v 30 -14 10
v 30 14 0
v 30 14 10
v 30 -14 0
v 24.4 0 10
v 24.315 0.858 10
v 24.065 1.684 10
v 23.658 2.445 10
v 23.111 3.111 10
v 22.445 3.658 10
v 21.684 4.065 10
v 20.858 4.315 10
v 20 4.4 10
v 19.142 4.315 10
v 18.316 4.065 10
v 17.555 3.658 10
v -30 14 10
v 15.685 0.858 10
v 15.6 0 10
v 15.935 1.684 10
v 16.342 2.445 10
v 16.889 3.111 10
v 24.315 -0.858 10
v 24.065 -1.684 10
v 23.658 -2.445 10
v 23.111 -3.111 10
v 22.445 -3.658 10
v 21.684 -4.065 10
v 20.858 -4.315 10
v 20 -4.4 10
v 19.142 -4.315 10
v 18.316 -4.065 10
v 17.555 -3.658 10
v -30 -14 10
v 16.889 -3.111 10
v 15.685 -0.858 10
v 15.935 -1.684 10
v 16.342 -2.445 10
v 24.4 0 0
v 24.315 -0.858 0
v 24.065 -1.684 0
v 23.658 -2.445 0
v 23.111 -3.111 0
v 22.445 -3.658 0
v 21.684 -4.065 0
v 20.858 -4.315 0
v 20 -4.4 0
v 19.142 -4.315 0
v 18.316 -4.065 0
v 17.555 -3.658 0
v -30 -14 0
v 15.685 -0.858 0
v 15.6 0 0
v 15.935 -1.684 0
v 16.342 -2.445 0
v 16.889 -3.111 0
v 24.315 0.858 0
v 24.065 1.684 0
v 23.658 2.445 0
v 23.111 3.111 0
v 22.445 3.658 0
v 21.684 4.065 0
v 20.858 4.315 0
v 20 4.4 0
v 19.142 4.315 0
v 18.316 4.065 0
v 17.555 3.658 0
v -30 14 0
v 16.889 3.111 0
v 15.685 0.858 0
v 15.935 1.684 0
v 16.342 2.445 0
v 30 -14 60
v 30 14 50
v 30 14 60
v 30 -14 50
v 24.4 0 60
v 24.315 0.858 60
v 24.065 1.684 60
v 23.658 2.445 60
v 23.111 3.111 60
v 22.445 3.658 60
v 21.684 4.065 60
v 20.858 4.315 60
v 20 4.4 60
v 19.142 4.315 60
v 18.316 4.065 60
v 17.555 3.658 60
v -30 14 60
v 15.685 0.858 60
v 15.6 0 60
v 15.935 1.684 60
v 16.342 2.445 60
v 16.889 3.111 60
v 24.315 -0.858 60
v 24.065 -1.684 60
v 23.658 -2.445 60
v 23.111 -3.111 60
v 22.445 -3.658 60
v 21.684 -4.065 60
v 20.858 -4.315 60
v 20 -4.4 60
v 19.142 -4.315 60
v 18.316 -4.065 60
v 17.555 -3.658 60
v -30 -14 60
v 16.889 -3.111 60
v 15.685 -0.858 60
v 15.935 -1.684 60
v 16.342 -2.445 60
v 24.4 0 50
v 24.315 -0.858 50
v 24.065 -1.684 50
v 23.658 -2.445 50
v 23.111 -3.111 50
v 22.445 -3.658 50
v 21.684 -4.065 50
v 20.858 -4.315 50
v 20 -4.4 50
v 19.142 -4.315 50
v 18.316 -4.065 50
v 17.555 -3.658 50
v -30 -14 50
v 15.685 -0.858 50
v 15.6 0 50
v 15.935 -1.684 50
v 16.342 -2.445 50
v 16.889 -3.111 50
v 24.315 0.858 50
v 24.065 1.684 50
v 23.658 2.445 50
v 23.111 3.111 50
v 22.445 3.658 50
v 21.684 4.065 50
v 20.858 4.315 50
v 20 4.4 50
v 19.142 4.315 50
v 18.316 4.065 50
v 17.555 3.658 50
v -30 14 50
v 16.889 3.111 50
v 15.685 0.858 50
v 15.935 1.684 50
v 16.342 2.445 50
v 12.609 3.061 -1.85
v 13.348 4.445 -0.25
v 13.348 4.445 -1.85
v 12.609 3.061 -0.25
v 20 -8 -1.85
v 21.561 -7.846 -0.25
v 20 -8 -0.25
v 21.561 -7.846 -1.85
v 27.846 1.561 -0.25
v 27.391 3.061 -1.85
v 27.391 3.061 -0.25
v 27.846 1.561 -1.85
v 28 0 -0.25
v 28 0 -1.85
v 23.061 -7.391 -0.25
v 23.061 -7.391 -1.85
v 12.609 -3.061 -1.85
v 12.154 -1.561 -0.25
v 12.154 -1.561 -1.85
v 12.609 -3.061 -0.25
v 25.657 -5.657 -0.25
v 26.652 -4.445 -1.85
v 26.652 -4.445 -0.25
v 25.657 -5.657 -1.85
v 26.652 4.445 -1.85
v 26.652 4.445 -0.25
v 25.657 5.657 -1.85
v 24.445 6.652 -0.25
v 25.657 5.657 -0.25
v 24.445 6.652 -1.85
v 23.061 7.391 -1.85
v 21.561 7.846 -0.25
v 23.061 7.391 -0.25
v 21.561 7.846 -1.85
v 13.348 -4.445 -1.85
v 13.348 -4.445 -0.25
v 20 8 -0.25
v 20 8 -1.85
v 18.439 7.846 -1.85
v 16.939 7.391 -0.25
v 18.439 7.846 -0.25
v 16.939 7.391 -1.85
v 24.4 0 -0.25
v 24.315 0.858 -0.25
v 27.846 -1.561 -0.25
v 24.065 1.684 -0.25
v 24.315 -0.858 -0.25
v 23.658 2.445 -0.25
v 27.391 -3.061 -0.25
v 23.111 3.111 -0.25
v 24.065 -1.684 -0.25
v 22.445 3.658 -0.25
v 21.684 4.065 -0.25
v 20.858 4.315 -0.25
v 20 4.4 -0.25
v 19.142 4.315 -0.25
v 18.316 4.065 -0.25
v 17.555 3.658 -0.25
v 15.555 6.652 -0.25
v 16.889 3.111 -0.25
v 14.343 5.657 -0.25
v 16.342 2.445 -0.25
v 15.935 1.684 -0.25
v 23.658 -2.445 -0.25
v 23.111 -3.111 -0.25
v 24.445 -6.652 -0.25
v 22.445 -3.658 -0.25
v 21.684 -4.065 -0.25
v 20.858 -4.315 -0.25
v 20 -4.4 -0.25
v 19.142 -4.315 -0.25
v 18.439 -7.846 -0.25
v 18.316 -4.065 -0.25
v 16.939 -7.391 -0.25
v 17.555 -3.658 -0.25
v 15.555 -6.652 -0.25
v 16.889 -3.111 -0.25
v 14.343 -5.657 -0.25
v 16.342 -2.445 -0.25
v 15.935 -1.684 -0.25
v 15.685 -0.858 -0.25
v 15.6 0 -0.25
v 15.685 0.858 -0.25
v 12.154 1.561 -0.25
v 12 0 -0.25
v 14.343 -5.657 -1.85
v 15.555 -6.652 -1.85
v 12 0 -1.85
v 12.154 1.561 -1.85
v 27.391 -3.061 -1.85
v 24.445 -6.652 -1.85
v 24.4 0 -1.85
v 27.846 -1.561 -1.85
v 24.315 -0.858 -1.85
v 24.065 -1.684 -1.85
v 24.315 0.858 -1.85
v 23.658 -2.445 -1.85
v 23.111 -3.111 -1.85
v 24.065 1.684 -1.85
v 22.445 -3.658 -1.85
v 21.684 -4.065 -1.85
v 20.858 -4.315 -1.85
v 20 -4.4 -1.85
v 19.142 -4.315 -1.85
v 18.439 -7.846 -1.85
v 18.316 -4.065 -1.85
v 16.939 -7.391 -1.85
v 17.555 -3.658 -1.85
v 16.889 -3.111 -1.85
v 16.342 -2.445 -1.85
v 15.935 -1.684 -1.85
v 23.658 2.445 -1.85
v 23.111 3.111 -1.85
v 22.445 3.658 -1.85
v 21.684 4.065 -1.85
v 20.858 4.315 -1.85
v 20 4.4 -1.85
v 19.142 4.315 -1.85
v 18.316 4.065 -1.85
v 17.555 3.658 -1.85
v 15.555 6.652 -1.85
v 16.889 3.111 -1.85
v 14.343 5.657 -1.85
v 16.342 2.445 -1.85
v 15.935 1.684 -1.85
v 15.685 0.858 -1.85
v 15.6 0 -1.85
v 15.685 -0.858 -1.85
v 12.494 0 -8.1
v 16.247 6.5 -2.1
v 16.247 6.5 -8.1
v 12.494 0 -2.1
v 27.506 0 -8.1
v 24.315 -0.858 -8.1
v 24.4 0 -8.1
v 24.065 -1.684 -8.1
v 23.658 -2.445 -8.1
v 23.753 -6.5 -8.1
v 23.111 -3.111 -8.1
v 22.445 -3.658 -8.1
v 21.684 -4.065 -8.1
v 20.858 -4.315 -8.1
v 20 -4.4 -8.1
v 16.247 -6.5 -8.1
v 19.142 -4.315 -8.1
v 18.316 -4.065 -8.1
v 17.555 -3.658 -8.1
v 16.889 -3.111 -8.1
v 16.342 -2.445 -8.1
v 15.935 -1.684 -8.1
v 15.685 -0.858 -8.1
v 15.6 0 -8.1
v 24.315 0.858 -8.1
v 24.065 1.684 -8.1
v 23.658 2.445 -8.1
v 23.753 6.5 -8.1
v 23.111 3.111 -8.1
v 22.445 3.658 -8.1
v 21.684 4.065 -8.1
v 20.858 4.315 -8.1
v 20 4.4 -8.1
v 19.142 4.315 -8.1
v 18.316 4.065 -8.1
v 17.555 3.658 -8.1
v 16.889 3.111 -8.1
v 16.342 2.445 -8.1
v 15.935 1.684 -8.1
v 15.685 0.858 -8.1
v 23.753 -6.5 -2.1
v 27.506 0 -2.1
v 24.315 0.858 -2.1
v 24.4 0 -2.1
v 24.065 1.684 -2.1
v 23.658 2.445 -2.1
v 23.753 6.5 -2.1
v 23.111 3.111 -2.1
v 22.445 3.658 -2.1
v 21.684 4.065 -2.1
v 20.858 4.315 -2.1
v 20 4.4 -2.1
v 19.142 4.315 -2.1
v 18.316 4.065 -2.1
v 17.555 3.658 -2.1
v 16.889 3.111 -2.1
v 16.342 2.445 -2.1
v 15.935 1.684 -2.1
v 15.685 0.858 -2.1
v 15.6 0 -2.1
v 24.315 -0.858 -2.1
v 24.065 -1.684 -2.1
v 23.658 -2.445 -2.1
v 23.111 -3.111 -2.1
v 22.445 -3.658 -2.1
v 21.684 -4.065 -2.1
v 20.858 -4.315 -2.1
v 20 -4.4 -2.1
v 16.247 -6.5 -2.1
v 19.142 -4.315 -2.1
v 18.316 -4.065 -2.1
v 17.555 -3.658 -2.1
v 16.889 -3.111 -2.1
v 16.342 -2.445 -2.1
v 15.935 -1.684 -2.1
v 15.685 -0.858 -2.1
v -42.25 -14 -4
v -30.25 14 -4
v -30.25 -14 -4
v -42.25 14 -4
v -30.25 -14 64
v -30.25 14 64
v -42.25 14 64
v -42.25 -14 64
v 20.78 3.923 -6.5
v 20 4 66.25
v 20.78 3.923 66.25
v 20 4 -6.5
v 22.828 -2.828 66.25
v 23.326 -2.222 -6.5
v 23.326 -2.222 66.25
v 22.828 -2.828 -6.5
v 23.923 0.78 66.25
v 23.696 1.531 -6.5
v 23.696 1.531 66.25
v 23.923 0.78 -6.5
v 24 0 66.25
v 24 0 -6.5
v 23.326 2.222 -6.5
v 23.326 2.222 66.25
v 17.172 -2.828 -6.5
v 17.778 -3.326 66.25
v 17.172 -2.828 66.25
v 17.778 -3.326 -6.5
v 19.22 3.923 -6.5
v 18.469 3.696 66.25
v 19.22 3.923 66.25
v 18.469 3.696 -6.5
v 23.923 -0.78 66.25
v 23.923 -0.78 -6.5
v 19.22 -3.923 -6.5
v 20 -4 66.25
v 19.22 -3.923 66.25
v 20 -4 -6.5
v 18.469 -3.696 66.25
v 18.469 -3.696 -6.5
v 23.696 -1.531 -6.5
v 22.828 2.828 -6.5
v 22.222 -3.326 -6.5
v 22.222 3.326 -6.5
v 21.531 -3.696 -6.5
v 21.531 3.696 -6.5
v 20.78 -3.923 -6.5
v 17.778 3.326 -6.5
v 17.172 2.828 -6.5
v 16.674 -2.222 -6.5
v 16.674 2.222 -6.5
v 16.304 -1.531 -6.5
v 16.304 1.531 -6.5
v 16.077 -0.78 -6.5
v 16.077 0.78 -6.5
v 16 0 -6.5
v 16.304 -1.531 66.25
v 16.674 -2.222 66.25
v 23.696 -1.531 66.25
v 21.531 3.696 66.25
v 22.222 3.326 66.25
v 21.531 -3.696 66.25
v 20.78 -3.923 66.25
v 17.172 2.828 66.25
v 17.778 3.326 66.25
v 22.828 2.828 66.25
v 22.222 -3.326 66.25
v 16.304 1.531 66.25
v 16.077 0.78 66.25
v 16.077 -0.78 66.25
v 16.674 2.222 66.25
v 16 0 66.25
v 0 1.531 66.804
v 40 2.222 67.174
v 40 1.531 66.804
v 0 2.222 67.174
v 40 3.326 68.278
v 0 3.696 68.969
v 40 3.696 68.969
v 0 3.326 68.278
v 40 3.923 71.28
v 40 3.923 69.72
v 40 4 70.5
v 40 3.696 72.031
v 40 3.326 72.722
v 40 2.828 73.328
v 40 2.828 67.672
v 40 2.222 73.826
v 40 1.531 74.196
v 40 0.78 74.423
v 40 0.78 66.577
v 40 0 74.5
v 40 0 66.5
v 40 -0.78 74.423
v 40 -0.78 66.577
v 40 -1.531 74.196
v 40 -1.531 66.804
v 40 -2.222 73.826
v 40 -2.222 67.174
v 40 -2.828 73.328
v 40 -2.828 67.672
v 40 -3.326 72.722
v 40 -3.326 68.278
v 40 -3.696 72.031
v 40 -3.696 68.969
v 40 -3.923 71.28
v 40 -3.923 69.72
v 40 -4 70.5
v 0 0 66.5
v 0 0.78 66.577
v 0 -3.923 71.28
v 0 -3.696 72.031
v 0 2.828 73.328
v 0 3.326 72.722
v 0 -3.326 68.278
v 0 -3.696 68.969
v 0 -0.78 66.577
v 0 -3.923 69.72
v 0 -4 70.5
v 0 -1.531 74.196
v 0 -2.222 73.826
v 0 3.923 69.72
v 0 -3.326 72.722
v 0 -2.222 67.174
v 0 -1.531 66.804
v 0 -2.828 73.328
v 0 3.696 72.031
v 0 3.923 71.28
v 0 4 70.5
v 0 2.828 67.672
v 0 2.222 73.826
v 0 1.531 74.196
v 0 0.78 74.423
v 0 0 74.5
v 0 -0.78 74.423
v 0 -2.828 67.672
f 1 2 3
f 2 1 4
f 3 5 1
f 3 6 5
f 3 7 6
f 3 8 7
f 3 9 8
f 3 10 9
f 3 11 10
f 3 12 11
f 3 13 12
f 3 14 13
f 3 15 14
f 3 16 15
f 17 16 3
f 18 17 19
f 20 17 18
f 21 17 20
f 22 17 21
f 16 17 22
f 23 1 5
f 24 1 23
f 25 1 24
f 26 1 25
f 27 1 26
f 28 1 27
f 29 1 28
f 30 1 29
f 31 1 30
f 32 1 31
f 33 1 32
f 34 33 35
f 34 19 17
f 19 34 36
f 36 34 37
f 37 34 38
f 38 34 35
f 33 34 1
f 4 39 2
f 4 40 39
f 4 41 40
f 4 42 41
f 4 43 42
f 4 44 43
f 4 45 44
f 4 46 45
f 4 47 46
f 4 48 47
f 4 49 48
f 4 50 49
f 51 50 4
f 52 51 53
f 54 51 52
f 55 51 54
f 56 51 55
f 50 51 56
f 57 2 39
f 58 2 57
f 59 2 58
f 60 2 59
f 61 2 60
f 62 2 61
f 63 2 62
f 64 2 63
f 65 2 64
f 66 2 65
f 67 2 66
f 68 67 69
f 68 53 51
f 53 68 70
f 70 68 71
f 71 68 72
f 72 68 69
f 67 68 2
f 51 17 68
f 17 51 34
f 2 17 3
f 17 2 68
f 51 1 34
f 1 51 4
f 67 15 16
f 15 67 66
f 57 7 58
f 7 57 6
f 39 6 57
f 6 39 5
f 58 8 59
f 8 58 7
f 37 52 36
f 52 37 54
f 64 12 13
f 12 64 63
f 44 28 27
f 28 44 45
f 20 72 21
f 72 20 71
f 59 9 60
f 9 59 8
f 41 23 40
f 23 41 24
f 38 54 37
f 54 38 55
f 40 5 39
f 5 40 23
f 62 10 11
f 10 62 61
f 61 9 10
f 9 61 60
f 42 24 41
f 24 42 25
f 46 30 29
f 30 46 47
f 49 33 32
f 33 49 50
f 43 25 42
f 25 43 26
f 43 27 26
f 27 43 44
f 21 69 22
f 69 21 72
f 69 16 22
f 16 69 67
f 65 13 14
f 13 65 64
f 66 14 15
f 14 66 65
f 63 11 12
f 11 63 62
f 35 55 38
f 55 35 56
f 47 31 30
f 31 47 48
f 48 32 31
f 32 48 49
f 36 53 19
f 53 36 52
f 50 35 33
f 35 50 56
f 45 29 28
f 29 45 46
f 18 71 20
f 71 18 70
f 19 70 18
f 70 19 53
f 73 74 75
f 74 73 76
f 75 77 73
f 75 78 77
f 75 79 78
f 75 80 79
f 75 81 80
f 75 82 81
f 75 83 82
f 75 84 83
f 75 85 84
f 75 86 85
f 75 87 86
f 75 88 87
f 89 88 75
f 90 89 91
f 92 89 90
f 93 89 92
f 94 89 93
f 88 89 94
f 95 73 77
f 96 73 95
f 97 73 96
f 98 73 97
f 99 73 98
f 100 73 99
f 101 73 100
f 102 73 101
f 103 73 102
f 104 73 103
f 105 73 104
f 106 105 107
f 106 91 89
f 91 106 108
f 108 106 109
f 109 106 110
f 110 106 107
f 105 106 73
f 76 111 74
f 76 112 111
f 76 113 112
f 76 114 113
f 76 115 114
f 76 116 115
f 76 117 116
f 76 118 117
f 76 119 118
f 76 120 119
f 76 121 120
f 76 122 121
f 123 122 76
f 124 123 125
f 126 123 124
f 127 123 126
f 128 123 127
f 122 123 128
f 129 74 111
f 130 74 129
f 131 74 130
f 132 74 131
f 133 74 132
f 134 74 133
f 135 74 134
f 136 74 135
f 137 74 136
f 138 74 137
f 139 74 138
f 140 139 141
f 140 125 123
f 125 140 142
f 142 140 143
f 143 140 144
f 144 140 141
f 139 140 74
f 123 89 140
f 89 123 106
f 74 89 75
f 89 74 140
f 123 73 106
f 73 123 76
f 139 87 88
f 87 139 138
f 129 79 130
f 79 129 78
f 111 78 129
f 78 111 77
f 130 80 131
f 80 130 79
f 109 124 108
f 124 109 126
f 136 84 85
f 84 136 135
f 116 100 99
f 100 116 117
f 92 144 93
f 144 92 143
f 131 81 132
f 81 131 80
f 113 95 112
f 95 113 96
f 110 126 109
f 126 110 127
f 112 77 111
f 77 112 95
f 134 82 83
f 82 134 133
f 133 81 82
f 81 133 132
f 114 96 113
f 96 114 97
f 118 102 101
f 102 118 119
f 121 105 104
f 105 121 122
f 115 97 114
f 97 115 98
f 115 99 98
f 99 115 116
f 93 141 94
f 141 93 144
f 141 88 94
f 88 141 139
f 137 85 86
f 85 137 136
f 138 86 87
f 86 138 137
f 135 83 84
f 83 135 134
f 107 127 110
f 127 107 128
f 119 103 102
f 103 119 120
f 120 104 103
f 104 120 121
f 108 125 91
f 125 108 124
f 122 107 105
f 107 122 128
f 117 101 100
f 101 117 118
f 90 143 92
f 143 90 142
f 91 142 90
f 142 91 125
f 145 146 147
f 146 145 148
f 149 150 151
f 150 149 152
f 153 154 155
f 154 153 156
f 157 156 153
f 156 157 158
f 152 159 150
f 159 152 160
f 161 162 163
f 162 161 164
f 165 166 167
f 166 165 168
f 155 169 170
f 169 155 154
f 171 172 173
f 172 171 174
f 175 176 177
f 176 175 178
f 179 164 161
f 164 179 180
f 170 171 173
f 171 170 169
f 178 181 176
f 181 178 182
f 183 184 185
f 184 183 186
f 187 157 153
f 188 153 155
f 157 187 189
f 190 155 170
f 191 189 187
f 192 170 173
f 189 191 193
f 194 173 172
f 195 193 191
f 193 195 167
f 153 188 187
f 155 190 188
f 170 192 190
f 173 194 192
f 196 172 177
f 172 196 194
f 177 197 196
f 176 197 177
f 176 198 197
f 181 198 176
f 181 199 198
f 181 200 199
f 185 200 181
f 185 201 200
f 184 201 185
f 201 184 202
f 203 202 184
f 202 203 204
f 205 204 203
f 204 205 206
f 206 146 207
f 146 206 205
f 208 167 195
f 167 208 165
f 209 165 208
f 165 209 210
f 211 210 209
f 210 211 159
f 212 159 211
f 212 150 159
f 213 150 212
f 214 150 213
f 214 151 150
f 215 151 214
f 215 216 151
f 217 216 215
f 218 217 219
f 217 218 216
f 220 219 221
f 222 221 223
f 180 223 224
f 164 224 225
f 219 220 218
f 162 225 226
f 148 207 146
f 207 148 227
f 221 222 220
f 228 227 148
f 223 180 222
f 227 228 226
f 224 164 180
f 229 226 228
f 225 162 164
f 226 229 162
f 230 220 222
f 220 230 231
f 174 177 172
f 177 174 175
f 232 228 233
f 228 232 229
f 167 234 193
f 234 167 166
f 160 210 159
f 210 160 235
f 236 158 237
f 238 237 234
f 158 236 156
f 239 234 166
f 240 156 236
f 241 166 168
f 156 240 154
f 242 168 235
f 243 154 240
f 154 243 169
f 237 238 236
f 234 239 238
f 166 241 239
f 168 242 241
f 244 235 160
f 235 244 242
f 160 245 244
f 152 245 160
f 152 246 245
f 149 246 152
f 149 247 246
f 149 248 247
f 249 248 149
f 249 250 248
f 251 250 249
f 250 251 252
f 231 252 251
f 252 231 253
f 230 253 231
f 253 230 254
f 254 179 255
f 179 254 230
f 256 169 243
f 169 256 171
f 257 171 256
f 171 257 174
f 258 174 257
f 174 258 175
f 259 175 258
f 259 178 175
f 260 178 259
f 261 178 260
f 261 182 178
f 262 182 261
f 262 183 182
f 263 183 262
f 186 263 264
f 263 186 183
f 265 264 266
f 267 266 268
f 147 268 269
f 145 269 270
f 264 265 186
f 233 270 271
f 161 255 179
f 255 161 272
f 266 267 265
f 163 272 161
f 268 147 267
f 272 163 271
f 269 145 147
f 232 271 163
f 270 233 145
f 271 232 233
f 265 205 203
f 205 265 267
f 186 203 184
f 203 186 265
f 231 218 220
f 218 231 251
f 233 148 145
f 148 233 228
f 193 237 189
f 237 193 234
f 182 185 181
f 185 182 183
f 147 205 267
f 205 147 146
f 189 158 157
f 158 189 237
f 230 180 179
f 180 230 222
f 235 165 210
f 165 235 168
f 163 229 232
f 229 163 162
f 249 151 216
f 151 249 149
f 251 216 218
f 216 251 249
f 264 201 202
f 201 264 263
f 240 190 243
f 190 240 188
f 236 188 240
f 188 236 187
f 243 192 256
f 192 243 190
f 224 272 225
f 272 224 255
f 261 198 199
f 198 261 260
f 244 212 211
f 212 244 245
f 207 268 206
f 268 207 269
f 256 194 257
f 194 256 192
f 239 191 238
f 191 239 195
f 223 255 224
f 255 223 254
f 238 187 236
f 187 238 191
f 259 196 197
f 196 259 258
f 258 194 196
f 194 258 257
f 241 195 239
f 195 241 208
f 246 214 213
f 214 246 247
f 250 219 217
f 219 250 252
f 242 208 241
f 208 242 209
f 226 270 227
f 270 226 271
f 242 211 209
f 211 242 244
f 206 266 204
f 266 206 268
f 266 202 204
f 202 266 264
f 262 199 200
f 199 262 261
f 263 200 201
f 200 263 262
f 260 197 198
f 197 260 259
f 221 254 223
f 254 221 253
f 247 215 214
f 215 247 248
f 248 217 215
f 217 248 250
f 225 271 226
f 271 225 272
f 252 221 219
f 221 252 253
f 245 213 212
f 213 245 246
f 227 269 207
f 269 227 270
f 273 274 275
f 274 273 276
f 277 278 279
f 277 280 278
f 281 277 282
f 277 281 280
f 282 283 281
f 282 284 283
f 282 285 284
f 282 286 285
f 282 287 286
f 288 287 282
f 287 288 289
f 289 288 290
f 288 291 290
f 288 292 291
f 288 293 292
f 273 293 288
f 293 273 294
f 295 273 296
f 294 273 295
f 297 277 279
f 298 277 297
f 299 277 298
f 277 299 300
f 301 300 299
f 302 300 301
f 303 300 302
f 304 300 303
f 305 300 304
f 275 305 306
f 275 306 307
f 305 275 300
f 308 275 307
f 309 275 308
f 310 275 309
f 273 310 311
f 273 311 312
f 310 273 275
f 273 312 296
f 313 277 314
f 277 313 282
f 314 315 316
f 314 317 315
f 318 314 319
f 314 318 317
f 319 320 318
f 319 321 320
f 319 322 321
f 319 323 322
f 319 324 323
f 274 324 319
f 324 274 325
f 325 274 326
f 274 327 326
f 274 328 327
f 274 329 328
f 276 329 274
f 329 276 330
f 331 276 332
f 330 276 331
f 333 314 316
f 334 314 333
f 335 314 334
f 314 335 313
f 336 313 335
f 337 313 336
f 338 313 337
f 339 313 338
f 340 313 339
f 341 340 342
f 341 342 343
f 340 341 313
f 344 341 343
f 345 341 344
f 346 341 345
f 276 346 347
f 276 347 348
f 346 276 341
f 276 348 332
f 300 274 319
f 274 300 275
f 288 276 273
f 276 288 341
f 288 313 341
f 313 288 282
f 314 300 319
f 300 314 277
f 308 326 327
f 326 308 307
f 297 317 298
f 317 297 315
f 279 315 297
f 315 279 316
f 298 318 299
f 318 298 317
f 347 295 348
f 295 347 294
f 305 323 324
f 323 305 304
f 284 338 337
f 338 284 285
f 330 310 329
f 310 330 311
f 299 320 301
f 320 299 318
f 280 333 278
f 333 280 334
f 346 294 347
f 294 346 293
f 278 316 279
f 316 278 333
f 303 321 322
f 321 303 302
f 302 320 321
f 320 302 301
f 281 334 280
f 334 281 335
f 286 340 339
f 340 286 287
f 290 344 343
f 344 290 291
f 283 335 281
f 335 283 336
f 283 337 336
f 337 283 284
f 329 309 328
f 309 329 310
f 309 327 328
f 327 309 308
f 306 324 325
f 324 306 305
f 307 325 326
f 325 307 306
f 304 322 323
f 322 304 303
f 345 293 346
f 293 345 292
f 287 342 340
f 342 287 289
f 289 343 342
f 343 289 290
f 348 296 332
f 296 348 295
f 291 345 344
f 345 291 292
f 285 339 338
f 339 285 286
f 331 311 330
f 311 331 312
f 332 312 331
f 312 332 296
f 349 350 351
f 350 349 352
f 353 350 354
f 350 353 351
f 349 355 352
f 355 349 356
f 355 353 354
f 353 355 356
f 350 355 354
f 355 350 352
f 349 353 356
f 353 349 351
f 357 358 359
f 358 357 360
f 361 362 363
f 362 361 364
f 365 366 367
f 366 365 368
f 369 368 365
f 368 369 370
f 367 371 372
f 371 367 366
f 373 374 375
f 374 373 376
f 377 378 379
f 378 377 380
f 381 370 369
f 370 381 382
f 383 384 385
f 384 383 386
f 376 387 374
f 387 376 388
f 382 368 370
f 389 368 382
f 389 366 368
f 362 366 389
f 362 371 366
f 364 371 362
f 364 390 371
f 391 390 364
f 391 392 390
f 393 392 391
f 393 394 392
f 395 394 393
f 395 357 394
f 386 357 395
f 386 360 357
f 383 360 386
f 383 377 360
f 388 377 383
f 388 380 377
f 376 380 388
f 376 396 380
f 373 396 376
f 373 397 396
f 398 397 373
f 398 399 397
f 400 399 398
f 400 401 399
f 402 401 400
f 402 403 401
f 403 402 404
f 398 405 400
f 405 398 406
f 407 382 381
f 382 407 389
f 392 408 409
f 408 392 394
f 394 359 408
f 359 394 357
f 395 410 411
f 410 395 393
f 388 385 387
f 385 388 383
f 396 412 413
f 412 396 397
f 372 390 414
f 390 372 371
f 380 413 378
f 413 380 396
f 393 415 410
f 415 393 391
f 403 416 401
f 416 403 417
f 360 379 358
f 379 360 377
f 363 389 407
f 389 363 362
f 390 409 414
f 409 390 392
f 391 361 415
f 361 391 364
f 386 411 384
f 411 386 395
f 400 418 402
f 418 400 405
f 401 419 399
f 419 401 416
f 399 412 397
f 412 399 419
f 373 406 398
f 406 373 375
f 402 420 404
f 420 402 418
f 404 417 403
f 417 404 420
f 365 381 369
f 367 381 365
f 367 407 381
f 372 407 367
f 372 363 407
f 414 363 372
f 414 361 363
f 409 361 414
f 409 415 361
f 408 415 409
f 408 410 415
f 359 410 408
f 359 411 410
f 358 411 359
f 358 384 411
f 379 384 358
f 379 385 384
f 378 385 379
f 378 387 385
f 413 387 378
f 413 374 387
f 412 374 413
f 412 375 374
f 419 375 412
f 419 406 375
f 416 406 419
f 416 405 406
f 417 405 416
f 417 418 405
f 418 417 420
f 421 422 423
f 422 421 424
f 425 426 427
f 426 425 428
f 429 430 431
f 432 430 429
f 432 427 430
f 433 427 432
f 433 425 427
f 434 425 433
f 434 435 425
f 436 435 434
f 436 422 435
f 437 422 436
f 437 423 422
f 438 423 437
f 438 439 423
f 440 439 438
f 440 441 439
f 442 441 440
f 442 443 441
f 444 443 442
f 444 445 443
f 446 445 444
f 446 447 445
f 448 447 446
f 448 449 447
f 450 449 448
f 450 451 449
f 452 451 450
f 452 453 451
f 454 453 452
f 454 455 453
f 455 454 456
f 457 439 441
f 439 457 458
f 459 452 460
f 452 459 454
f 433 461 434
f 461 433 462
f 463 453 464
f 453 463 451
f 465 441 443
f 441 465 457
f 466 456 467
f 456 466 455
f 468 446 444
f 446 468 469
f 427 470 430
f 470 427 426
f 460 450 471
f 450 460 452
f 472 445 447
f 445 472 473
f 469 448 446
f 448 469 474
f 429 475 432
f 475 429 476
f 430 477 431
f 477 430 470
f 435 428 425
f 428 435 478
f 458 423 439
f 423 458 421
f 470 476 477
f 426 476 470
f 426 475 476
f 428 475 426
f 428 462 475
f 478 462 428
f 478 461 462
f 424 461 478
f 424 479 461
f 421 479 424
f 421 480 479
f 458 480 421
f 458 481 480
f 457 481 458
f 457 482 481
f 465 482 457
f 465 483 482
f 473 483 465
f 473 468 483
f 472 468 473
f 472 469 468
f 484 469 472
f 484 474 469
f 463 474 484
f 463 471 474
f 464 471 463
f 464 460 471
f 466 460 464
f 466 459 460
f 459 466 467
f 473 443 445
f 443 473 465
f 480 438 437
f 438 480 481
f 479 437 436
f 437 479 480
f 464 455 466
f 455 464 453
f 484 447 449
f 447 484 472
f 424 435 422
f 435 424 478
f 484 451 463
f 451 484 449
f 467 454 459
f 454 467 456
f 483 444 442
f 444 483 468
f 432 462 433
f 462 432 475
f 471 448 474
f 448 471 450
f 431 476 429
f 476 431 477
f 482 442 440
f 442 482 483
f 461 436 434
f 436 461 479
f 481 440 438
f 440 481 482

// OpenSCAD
$fn = 32;

// ------------------------------------------------------------------------
// C clamp: throat 50 mm, screw d8
// Every part is its own module, assembly() places every instance.
// ------------------------------------------------------------------------

// --- part 1 ---
module clamp_arm() {
  difference() {
    translate([-30, -14, 0]) cube([60, 28, 10]);
    translate([20, 0, -1]) cylinder(h = 12, d = 8.8);
  }
}

// --- part 2 ---
module clamp_spine() {
  difference() {
    translate([-34, -14, 0]) cube([68, 28, 12]);
  }
}

// --- part 3 ---
module clamp_screw() {
  translate([0, 0, -36.375]) cylinder(h = 72.75, d = 8);
}

// --- part 4 ---
module clamp_washer() {
  difference() {
      translate([0, 0, 0]) cylinder(h = 1.6, d = 16);
      translate([0, 0, -1]) cylinder(h = 3.6, d = 8.8);
    }
}

// --- part 5 ---
module clamp_nut() {
  difference() {
    linear_extrude(height = 6) polygon(points = [[7.506, 0], [3.753, 6.5], [-3.753, 6.5], [-7.506, 0], [-3.753, -6.5], [3.753, -6.5]]);
    translate([0, 0, -1]) cylinder(h = 8, d = 8.8);
  }
}

// --- part 6 ---
module tommy_bar() {
  translate([0, 0, -20]) cylinder(h = 40, d = 8);
}

// --- assembly ---
module assembly() {
  color([0.80, 0.24, 0.20]) translate([0, 0, 0]) rotate([0, 0, 0]) clamp_arm();
  color([0.20, 0.45, 0.75]) translate([0, 0, 50]) rotate([0, 0, 0]) clamp_arm();
  color([0.25, 0.62, 0.32]) translate([-42.25, 0, 30]) rotate([0, 90, 0]) clamp_spine();
  color([0.92, 0.70, 0.18]) translate([20, 0, 29.875]) rotate([0, 0, 0]) clamp_screw();
  color([0.58, 0.35, 0.70]) translate([20, 0, -1.85]) rotate([0, 0, 0]) clamp_washer();
  color([0.16, 0.66, 0.66]) translate([20, 0, -8.1]) rotate([0, 0, 0]) clamp_nut();
  color([0.85, 0.48, 0.18]) translate([20, 0, 70.5]) rotate([0, 90, 0]) tommy_bar();
}

assembly();
